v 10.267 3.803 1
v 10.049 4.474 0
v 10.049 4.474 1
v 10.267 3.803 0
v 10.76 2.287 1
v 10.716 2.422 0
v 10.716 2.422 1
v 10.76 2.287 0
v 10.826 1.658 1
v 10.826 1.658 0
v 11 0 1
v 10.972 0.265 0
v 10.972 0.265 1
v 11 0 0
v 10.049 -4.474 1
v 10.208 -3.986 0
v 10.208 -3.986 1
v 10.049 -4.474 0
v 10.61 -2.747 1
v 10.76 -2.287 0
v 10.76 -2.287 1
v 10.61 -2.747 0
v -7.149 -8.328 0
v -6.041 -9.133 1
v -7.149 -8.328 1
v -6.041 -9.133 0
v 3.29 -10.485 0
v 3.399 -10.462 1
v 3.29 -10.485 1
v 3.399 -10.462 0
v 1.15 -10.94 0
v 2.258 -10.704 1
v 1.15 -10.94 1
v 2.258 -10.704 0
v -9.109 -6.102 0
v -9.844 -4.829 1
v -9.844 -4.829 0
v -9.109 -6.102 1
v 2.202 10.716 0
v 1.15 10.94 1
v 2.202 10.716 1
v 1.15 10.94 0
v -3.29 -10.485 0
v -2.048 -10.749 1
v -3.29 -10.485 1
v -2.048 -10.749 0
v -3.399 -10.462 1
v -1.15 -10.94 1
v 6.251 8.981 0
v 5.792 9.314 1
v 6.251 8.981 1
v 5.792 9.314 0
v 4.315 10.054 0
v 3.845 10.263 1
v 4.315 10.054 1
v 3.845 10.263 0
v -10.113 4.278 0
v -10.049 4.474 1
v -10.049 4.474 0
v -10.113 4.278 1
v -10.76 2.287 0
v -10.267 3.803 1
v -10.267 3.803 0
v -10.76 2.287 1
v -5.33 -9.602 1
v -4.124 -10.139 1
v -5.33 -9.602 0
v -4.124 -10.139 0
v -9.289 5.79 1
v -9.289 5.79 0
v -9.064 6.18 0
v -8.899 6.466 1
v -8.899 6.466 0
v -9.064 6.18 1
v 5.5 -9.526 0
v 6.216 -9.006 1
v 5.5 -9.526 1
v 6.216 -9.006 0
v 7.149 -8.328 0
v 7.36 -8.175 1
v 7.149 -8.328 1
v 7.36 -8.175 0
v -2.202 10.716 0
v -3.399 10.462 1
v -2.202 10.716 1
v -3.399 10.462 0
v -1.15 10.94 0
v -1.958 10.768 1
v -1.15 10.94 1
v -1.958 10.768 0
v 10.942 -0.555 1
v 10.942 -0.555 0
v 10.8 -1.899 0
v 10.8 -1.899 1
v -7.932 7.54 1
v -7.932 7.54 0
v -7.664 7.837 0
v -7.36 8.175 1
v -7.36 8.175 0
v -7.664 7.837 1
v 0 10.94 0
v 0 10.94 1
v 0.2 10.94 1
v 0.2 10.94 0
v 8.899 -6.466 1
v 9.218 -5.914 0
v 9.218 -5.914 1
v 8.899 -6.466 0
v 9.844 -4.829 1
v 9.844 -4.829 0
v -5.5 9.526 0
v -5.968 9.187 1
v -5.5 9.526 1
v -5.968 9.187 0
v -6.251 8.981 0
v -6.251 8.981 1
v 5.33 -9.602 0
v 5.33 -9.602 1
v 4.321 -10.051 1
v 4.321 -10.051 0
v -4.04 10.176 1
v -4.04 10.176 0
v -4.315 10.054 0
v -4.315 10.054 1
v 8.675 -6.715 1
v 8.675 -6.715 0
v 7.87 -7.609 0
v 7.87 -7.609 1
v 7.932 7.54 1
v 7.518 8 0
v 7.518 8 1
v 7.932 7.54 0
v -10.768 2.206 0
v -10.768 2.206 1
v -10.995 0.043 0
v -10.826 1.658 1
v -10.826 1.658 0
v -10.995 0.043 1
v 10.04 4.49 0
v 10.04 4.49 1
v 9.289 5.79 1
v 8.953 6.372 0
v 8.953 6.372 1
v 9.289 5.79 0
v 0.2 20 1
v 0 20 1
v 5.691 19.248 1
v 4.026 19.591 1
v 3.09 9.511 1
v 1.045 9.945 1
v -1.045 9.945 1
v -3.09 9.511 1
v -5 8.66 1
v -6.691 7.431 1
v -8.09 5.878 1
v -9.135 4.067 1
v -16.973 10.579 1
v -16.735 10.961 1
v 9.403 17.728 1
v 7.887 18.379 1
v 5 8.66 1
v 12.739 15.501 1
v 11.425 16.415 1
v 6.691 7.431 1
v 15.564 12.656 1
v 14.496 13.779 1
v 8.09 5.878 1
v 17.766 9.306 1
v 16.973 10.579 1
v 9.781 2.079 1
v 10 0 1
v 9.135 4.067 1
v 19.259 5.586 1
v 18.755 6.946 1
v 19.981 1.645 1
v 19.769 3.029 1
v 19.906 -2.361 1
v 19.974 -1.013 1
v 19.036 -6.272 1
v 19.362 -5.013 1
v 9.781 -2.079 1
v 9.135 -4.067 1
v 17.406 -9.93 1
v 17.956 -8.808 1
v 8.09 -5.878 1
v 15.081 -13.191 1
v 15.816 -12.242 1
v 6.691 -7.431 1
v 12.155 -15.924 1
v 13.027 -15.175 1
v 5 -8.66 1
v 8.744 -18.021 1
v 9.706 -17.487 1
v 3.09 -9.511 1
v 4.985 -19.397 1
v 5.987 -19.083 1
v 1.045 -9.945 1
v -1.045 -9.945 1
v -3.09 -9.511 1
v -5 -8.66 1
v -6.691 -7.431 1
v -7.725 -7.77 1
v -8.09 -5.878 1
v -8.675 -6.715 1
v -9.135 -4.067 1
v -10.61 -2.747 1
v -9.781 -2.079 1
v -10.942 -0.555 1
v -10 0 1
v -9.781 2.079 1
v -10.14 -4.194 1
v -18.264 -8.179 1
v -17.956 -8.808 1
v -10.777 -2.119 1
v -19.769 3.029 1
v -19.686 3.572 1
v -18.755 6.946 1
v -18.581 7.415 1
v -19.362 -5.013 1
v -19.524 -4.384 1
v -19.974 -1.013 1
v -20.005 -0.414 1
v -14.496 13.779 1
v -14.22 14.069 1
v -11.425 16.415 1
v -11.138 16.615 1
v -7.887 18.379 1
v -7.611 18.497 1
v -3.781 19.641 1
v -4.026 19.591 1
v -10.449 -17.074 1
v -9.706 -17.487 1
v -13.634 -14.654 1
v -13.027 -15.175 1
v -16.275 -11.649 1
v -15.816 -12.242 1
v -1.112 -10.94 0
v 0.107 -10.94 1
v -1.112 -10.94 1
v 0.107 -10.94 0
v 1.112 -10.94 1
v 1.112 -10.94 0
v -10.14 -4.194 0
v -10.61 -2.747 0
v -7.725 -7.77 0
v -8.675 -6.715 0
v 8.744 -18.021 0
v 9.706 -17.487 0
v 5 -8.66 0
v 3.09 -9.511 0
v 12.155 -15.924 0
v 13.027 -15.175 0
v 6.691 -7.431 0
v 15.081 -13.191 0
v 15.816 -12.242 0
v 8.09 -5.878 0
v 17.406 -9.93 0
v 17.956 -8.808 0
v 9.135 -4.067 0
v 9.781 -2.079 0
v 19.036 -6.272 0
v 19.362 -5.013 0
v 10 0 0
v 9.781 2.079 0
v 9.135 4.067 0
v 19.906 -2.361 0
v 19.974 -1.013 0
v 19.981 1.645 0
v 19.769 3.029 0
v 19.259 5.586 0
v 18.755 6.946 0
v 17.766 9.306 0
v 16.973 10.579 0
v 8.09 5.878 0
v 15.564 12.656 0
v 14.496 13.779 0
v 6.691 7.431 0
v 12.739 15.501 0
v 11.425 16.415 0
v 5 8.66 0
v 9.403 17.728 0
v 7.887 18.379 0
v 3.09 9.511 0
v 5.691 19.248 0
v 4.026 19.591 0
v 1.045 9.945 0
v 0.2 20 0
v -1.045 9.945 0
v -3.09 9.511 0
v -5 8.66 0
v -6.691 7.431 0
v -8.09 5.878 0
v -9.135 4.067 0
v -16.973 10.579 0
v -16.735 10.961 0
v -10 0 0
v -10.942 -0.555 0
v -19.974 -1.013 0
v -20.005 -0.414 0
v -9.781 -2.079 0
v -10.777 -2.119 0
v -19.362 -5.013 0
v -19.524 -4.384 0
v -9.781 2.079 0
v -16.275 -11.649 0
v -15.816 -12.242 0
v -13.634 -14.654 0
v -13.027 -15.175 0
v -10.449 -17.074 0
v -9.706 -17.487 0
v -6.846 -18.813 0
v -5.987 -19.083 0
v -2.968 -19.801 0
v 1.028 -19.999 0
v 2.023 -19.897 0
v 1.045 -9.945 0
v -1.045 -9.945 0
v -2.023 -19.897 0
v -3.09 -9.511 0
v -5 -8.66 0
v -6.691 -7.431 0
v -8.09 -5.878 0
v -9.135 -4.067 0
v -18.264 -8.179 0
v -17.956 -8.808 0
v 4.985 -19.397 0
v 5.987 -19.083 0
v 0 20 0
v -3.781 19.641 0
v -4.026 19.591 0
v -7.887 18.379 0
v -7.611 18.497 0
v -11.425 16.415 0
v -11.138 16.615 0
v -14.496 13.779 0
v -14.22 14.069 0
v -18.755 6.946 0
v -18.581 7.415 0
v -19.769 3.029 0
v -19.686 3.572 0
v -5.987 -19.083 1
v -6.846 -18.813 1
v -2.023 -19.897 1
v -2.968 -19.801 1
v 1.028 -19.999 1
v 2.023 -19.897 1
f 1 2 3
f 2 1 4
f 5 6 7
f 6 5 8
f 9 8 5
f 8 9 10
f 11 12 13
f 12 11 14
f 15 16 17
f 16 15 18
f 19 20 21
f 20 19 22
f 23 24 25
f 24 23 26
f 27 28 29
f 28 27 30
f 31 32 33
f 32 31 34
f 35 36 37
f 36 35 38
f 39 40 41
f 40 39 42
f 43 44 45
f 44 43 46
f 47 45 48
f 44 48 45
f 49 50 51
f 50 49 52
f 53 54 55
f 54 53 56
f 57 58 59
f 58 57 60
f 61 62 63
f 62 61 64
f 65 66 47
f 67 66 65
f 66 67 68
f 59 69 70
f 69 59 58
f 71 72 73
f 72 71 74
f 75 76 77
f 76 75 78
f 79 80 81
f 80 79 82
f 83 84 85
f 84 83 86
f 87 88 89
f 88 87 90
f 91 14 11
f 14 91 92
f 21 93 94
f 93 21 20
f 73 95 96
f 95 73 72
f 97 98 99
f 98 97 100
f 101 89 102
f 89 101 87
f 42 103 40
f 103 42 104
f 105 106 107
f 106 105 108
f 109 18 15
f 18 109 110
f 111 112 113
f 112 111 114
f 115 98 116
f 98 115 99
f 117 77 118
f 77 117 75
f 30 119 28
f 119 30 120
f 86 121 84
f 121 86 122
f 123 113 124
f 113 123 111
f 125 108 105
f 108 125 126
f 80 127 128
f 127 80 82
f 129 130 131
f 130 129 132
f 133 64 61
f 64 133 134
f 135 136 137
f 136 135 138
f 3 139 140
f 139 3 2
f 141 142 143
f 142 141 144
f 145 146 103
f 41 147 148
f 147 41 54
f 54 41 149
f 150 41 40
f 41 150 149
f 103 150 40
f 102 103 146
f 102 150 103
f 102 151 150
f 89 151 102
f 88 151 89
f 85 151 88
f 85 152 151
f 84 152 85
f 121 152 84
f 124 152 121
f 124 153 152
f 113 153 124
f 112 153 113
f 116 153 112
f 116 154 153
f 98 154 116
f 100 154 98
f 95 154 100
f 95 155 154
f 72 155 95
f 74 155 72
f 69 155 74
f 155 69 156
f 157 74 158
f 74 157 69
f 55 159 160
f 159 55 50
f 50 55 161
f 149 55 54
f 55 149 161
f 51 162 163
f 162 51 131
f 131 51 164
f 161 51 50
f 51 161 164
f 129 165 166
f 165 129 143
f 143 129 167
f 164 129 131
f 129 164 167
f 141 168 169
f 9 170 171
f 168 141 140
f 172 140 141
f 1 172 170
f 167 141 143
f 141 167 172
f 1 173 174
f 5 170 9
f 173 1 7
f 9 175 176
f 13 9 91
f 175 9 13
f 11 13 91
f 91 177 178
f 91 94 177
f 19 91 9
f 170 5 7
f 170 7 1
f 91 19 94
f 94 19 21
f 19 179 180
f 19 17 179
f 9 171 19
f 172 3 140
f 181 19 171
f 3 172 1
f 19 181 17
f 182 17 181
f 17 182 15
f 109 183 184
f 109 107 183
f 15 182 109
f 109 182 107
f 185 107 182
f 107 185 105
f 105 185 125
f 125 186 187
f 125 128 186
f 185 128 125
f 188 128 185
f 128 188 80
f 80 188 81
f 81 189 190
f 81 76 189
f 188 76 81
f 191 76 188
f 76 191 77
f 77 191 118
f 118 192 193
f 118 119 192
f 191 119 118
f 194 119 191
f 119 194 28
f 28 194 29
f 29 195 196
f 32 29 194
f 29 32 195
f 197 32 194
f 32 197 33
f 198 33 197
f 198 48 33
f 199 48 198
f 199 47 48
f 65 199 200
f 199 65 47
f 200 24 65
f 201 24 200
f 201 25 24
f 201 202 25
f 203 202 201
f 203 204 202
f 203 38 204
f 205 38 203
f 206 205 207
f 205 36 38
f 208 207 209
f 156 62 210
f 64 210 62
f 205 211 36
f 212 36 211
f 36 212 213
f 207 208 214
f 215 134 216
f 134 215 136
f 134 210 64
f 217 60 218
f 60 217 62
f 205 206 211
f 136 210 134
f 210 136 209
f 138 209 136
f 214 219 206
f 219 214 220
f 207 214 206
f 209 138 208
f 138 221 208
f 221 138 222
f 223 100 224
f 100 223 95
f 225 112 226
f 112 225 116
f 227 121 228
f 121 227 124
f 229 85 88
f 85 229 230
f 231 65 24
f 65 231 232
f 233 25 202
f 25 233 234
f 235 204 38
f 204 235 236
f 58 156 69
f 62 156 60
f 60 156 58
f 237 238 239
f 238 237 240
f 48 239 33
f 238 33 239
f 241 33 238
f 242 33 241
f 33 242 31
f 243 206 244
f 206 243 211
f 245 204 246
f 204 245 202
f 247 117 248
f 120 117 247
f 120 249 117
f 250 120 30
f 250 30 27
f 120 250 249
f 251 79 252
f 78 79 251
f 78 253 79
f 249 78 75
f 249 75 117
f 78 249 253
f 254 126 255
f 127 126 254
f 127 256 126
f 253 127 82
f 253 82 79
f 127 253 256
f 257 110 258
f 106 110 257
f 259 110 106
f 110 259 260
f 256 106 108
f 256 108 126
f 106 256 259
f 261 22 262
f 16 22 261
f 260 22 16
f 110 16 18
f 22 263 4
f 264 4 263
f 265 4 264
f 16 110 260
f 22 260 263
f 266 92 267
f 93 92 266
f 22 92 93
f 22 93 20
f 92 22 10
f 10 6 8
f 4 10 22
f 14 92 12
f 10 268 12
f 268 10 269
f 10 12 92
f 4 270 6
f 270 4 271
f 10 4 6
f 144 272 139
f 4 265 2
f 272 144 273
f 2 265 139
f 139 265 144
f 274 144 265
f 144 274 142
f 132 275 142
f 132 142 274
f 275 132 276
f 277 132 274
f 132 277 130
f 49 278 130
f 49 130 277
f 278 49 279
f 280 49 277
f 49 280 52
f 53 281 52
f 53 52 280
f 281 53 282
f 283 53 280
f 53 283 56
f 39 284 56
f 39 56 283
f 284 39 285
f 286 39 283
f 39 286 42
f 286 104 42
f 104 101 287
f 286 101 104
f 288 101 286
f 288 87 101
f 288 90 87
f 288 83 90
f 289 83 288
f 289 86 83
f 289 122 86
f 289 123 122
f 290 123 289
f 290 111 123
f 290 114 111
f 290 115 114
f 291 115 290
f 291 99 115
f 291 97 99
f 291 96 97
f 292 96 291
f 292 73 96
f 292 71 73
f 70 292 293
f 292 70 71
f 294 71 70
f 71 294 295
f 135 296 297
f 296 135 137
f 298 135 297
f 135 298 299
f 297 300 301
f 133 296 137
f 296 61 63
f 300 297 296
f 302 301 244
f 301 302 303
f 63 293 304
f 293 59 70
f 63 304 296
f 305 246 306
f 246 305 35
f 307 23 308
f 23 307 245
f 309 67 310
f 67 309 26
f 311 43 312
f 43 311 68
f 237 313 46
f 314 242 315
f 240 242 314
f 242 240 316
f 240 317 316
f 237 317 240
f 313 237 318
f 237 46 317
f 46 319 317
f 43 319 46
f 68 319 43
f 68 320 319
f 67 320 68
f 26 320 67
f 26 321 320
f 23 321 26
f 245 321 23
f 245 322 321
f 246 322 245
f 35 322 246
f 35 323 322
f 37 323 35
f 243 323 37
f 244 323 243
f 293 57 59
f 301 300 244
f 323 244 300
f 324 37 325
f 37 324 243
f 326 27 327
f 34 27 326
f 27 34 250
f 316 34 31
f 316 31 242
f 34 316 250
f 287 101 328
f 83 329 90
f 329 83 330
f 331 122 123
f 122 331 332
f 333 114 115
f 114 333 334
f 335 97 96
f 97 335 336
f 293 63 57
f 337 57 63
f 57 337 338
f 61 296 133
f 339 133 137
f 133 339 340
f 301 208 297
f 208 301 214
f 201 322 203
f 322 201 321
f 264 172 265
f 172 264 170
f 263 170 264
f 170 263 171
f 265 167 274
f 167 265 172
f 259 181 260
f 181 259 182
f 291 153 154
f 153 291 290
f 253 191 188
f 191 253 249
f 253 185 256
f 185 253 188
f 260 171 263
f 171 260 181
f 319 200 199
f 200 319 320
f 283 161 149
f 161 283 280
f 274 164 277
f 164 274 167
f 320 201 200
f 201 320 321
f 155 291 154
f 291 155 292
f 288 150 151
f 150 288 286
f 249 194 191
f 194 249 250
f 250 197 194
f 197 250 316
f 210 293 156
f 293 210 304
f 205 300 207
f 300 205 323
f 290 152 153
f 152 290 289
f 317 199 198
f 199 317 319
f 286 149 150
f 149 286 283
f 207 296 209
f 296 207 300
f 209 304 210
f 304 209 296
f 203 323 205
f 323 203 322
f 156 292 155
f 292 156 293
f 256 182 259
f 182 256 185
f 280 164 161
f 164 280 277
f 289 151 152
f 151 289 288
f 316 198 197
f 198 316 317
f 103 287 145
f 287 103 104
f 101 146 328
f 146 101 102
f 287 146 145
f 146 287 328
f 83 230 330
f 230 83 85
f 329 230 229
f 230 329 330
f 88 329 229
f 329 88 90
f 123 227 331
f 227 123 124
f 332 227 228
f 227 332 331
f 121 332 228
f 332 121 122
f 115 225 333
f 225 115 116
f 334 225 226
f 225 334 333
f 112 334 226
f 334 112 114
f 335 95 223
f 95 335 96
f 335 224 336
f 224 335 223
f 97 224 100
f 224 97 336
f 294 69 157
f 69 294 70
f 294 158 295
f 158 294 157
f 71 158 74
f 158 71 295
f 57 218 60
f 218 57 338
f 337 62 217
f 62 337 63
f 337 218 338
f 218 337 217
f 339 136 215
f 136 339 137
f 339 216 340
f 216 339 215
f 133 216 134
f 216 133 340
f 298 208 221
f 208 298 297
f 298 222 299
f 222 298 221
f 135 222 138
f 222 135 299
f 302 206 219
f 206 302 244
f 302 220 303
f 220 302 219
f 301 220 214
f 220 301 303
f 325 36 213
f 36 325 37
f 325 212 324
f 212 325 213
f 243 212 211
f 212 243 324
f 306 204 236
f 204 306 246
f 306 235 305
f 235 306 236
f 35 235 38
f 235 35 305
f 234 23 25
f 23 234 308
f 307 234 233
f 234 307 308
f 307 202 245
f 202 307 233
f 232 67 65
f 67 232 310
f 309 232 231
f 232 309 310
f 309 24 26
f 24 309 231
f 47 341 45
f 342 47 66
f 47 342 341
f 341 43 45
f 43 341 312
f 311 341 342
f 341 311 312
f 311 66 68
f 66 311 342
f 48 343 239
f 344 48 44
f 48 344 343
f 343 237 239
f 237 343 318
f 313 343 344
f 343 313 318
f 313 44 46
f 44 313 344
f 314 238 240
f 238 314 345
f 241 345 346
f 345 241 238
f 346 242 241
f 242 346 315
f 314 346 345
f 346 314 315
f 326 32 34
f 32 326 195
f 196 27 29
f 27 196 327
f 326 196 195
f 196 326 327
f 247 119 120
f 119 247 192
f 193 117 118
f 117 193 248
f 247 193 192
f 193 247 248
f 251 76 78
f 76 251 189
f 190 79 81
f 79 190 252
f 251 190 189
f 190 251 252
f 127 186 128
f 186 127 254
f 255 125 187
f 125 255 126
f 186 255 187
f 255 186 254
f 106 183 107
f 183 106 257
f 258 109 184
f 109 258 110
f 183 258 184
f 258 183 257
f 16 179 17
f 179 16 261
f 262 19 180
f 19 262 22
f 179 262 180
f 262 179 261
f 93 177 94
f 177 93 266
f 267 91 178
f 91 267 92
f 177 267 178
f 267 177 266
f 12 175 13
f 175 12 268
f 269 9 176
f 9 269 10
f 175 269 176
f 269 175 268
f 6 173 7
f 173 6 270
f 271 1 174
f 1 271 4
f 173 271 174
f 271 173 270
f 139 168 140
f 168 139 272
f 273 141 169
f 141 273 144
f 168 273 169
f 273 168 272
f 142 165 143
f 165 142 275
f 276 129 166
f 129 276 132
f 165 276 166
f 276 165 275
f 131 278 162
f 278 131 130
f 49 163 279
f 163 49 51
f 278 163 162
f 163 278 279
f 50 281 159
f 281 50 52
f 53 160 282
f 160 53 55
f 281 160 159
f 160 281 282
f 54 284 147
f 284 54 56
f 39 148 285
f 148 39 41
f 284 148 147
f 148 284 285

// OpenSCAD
// Wall Thickness Test Object

start_thickness = 0.2; // [0:0.01:2]
increment = 0.05; // [0:0.01:0.2]
iterations = 30; // [10:1:50]
length = 10; // [5:2:50]
offset = 10; // [5:2:40]
height = 1.0; // [0.1:0.1:2]
base_thickness = 1; // [1:1:100]
base_height = 1.0; // [0.1:0.1:2]
  
module walltest()
{
  module testline(width, length, height, offset, theta)
  {
      rotate(theta)
      translate([0, offset, 0])
      cube([width, length, height], center=false);
  }

  difference() {
    cylinder(base_height, offset+base_thickness, offset+base_thickness, center=false);
    translate([0, 0, -1])
    cylinder(base_height+2, offset, offset, center=false);
  }

  for(i = [0:iterations]) {
    testline(start_thickness + i * increment, length, height, offset, 360/(iterations+1) * i);
    echo(start_thickness + i * increment);
  }
}

walltest();
